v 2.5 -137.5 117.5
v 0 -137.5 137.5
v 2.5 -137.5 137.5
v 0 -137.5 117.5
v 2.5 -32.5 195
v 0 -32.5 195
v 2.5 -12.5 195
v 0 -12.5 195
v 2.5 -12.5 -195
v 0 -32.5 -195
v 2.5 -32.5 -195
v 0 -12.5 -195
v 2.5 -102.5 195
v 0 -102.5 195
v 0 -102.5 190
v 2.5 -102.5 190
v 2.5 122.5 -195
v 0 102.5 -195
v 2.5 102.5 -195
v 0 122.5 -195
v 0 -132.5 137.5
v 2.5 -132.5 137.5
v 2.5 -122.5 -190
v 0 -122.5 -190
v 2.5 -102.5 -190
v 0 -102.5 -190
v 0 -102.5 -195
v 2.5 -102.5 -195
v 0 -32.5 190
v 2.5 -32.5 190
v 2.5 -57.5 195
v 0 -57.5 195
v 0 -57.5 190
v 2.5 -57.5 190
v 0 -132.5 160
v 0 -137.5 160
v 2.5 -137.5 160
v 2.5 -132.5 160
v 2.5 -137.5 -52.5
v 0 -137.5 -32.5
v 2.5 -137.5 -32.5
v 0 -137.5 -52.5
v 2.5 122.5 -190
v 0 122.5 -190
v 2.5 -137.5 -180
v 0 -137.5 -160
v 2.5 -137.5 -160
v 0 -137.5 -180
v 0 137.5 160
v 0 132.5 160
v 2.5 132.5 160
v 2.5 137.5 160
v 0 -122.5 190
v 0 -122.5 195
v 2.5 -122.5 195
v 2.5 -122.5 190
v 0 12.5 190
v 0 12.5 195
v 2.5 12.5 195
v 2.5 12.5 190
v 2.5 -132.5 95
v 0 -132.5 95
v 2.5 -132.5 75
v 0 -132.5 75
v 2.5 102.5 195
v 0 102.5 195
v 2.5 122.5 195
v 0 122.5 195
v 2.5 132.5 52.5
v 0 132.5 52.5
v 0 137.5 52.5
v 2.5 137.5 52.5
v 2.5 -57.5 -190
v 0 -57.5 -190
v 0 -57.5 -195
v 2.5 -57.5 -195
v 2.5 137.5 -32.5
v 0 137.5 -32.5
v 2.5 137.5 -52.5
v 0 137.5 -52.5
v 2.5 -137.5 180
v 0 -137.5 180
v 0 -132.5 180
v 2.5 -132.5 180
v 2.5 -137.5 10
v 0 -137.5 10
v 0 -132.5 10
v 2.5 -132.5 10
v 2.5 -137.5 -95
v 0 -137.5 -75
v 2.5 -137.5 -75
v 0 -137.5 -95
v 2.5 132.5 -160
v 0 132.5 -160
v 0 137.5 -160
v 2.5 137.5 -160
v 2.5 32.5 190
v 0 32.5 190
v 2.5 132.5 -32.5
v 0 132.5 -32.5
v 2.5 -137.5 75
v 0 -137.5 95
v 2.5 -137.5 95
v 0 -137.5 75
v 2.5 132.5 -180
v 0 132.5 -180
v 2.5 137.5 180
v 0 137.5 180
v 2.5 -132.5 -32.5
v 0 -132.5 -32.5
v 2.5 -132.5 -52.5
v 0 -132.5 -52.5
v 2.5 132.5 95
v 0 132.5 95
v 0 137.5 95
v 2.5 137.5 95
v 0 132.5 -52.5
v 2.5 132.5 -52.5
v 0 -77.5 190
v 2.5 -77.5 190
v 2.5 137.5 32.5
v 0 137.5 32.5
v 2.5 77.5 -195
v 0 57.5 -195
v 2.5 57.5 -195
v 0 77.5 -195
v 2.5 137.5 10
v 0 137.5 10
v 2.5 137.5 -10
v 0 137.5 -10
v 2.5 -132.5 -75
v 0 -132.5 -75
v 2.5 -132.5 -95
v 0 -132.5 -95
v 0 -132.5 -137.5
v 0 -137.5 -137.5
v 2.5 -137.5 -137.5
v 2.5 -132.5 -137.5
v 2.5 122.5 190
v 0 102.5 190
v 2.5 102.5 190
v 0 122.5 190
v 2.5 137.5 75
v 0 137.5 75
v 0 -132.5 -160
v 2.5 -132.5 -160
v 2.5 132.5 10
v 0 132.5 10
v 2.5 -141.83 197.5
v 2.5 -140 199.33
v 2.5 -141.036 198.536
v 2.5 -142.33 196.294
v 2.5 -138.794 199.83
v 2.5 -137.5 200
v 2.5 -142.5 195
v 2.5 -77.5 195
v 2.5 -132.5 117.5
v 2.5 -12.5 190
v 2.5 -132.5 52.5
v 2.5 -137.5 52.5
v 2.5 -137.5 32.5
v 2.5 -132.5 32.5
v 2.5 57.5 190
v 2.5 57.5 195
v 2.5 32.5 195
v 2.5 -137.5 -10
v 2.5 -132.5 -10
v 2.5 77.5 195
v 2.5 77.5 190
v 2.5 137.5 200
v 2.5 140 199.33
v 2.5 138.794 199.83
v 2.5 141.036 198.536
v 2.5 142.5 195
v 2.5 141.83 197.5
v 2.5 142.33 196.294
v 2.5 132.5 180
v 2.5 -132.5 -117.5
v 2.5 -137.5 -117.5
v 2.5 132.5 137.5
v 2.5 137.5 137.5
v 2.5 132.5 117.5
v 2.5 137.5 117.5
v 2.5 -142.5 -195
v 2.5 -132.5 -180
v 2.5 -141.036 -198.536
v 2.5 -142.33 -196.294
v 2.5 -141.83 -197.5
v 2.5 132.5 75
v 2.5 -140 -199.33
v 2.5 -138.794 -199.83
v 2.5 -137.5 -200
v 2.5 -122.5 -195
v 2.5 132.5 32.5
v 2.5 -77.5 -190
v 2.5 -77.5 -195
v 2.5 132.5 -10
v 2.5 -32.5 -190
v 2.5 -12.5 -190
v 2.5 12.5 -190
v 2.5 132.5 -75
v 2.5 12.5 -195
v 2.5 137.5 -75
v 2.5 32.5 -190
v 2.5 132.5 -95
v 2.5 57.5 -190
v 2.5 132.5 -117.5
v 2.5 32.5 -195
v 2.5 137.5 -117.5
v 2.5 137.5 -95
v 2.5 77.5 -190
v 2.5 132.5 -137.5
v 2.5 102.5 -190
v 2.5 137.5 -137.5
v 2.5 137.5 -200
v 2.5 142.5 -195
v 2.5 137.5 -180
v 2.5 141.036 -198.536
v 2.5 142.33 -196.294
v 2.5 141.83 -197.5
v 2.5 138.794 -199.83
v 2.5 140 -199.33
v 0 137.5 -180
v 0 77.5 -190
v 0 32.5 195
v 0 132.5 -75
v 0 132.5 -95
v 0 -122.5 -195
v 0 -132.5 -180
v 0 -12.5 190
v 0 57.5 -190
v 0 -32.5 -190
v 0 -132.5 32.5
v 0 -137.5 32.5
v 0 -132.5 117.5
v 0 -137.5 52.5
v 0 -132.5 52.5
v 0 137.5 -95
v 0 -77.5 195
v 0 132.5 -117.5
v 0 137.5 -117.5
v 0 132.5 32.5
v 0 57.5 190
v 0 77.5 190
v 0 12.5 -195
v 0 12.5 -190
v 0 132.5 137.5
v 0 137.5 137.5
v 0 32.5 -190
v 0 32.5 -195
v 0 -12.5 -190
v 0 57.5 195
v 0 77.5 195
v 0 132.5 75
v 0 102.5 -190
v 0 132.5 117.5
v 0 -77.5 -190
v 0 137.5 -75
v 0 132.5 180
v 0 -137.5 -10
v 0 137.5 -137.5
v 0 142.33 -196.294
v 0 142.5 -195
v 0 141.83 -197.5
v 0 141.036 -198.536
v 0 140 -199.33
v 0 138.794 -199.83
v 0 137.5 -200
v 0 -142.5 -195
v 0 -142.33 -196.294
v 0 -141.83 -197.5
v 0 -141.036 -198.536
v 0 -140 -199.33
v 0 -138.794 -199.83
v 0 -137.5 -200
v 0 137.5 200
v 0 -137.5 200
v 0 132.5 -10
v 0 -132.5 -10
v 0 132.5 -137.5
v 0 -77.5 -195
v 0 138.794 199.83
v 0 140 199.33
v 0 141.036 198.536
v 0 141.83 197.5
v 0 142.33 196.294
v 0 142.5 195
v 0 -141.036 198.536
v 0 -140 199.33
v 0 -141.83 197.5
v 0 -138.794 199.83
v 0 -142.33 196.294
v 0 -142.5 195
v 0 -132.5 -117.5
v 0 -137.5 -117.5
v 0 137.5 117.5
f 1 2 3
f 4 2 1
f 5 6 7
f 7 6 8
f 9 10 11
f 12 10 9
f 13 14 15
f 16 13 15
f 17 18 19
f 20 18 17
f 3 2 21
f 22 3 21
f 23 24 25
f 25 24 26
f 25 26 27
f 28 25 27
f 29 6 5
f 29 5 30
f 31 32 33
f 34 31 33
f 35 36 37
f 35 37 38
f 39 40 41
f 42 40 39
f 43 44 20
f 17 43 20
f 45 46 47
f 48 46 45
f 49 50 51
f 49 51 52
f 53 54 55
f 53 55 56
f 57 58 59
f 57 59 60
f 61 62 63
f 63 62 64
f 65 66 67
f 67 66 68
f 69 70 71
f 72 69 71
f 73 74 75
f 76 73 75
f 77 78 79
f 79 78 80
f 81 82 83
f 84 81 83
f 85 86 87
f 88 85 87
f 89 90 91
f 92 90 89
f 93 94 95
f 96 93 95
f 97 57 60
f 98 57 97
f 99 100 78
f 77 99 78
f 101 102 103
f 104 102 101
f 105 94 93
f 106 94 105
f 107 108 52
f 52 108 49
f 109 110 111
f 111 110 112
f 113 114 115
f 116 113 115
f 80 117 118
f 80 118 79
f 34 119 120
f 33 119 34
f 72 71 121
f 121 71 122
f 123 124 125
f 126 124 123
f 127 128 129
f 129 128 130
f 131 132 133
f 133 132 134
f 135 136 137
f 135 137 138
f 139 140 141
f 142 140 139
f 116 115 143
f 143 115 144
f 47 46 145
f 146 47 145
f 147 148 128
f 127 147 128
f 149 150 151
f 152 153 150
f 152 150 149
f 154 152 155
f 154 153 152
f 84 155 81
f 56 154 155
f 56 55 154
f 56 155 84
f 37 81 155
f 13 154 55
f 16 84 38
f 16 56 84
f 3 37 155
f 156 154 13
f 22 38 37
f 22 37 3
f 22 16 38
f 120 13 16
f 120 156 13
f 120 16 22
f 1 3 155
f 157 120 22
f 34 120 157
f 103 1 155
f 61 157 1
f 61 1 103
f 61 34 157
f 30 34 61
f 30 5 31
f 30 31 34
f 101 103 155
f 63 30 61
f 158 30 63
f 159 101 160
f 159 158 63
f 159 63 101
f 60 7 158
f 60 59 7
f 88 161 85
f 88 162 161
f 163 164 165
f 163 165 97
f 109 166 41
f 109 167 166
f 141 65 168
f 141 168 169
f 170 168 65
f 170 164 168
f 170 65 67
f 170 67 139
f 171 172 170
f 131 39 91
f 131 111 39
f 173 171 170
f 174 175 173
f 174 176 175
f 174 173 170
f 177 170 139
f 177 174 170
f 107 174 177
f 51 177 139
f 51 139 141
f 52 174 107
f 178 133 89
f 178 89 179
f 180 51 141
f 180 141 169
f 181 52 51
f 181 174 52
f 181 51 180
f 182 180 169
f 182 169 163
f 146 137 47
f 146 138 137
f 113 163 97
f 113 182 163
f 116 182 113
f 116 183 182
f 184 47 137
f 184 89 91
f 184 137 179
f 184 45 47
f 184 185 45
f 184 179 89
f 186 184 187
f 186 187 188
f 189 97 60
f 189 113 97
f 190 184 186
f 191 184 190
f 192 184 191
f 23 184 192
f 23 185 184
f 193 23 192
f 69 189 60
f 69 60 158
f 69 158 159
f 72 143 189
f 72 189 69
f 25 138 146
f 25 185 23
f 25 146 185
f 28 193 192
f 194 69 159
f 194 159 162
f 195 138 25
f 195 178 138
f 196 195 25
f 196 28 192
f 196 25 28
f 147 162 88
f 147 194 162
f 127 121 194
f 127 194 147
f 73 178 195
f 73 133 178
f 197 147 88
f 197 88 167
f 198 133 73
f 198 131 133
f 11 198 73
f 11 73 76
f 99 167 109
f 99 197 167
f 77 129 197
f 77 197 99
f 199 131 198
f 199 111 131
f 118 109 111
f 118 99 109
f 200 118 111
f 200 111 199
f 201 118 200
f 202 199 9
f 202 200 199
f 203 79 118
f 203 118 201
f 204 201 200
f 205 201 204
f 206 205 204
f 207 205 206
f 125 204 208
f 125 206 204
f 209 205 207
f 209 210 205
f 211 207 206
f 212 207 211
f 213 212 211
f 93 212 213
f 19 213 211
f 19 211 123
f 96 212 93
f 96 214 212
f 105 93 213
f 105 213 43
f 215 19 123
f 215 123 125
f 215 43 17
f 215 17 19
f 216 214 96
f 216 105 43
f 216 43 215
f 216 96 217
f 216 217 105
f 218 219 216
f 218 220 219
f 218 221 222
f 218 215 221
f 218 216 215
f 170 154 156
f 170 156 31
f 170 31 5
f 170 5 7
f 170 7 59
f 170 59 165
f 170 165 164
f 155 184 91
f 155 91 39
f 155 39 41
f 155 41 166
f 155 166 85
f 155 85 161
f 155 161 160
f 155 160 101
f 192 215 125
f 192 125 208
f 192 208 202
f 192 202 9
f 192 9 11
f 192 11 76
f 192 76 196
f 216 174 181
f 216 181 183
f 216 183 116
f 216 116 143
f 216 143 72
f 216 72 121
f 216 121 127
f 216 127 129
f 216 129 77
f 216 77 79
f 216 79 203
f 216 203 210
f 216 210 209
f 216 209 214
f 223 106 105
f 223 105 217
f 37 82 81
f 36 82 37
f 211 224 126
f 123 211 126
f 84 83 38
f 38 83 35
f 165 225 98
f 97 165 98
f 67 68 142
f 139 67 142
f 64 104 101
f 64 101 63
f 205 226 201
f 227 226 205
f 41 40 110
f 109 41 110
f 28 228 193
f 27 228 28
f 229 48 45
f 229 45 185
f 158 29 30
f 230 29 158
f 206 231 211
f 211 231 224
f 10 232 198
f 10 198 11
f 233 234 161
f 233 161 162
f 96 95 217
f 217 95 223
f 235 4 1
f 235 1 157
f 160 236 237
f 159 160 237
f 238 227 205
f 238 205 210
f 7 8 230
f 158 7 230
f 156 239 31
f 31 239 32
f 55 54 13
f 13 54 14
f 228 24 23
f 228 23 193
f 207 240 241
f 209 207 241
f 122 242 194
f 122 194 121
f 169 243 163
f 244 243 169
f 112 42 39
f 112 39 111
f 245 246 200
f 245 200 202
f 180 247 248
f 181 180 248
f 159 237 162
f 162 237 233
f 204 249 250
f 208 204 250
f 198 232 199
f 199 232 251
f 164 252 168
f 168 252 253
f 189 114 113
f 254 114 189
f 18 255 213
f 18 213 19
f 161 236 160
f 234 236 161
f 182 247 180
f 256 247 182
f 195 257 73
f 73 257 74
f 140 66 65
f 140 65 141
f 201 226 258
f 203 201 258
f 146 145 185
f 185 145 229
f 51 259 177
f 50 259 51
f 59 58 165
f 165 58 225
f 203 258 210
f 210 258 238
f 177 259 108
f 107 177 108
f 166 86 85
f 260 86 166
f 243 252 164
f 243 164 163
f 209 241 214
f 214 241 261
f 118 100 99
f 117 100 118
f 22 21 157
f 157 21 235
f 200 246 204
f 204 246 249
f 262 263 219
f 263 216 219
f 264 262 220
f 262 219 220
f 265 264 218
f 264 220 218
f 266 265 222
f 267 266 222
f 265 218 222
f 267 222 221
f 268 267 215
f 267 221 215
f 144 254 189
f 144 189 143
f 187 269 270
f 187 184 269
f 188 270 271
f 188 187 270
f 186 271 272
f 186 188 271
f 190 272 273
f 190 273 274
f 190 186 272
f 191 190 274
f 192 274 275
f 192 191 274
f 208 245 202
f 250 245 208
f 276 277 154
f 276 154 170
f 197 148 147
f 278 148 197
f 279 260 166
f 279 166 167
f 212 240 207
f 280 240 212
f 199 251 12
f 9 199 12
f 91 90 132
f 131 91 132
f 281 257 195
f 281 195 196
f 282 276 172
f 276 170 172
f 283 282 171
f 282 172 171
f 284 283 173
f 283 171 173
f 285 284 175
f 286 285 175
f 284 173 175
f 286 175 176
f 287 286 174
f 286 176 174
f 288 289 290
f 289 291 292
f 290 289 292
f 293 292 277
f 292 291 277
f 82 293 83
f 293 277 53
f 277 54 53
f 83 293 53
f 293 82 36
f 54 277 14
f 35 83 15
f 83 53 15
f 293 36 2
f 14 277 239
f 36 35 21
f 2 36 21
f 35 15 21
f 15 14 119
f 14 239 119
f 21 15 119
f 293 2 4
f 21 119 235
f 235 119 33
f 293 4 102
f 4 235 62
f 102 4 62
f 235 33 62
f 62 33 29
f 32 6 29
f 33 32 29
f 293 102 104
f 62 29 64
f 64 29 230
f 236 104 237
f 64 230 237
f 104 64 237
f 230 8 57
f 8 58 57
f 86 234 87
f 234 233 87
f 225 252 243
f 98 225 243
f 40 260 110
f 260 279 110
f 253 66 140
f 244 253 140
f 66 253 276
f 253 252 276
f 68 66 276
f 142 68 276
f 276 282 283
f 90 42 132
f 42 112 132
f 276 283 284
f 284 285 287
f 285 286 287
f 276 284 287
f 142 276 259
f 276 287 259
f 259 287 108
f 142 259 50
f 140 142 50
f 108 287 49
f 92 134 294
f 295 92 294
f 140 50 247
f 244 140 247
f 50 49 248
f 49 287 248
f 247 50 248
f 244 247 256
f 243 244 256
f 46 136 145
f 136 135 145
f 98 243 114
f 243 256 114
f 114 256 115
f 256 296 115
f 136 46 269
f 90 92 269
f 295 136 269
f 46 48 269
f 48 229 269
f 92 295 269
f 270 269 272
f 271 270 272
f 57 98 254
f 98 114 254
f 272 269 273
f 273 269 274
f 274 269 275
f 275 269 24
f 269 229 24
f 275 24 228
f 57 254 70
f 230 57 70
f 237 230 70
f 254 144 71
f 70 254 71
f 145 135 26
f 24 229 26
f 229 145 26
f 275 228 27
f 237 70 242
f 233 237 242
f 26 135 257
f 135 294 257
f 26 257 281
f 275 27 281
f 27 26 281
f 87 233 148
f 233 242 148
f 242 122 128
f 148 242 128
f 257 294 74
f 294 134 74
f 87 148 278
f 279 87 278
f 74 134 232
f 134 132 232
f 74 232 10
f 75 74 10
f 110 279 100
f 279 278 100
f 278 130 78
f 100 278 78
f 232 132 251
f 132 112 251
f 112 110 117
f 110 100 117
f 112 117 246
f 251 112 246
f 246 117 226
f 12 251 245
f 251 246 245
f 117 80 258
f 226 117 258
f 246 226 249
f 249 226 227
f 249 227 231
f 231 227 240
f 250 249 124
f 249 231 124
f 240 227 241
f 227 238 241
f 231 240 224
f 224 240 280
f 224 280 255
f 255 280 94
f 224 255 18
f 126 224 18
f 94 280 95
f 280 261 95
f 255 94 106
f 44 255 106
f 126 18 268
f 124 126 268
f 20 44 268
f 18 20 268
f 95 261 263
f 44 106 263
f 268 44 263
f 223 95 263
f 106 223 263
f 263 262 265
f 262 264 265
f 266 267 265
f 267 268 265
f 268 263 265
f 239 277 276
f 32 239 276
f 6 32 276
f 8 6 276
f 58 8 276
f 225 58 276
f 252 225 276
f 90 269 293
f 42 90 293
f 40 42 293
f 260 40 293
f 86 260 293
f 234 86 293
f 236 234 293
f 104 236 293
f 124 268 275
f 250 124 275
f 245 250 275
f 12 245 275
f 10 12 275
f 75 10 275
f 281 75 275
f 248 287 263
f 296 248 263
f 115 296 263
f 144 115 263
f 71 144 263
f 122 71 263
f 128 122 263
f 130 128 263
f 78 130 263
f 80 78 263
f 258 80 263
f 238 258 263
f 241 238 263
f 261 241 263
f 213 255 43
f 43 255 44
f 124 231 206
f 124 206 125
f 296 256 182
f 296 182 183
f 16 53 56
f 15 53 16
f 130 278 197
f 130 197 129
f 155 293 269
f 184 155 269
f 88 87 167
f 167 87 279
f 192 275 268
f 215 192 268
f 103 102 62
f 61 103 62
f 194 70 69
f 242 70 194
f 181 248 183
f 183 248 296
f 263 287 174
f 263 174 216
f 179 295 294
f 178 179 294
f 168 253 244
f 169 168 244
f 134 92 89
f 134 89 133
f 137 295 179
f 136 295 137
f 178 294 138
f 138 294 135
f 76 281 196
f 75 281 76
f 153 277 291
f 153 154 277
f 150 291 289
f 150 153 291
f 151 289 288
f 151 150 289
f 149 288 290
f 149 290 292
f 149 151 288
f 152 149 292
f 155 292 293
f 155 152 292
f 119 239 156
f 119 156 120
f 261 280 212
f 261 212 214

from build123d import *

# Parameters (mm, degrees)
SKETCH1_2_W         = 400
SKETCH1_2_H         = 285
SKETCH1_2_W_2       = 20
SKETCH1_2_H_2       = 5
SKETCH1_2_W_3       = 5
SKETCH1_2_H_3       = 20
BOSS_EXTRUDE3_DEPTH = 2.5
FILLET2_R           = 5


with BuildPart() as part:
    # Sketch1<2> → Boss-Extrude3 (new body)
    with BuildSketch(Plane(origin=(0, 0, 0), x_dir=(0, 0, -1), z_dir=(1, 0, 0))):
        Rectangle(SKETCH1_2_W, SKETCH1_2_H)
        with Locations((-170, 135)):
            Rectangle(SKETCH1_2_W_2, SKETCH1_2_H_2, mode=Mode.SUBTRACT)
        with Locations((-170, -135)):
            Rectangle(SKETCH1_2_W_2, SKETCH1_2_H_2, mode=Mode.SUBTRACT)
        with Locations((-127.5, 135)):
            Rectangle(SKETCH1_2_W_2, SKETCH1_2_H_2, mode=Mode.SUBTRACT)
        with Locations((-127.5, -135)):
            Rectangle(SKETCH1_2_W_2, SKETCH1_2_H_2, mode=Mode.SUBTRACT)
        with Locations((-85, 135)):
            Rectangle(SKETCH1_2_W_2, SKETCH1_2_H_2, mode=Mode.SUBTRACT)
        with Locations((-85, -135)):
            Rectangle(SKETCH1_2_W_2, SKETCH1_2_H_2, mode=Mode.SUBTRACT)
        with Locations((-42.5, 135)):
            Rectangle(SKETCH1_2_W_2, SKETCH1_2_H_2, mode=Mode.SUBTRACT)
        with Locations((-42.5, -135)):
            Rectangle(SKETCH1_2_W_2, SKETCH1_2_H_2, mode=Mode.SUBTRACT)
        with Locations((0, 135)):
            Rectangle(SKETCH1_2_W_2, SKETCH1_2_H_2, mode=Mode.SUBTRACT)
        with Locations((0, -135)):
            Rectangle(SKETCH1_2_W_2, SKETCH1_2_H_2, mode=Mode.SUBTRACT)
        with Locations((42.5, 135)):
            Rectangle(SKETCH1_2_W_2, SKETCH1_2_H_2, mode=Mode.SUBTRACT)
        with Locations((42.5, -135)):
            Rectangle(SKETCH1_2_W_2, SKETCH1_2_H_2, mode=Mode.SUBTRACT)
        with Locations((85, 135)):
            Rectangle(SKETCH1_2_W_2, SKETCH1_2_H_2, mode=Mode.SUBTRACT)
        with Locations((85, -135)):
            Rectangle(SKETCH1_2_W_2, SKETCH1_2_H_2, mode=Mode.SUBTRACT)
        with Locations((127.5, 135)):
            Rectangle(SKETCH1_2_W_2, SKETCH1_2_H_2, mode=Mode.SUBTRACT)
        with Locations((127.5, -135)):
            Rectangle(SKETCH1_2_W_2, SKETCH1_2_H_2, mode=Mode.SUBTRACT)
        with Locations((170, 135)):
            Rectangle(SKETCH1_2_W_2, SKETCH1_2_H_2, mode=Mode.SUBTRACT)
        with Locations((170, -135)):
            Rectangle(SKETCH1_2_W_2, SKETCH1_2_H_2, mode=Mode.SUBTRACT)
        with Locations((192.5, 112.5)):
            Rectangle(SKETCH1_2_W_3, SKETCH1_2_H_3, mode=Mode.SUBTRACT)
        with Locations((-192.5, 112.5)):
            Rectangle(SKETCH1_2_W_3, SKETCH1_2_H_3, mode=Mode.SUBTRACT)
        with Locations((-192.5, 67.5)):
            Rectangle(SKETCH1_2_W_3, SKETCH1_2_H_3, mode=Mode.SUBTRACT)
        with Locations((192.5, 67.5)):
            Rectangle(SKETCH1_2_W_3, SKETCH1_2_H_3, mode=Mode.SUBTRACT)
        with Locations((-192.5, 22.5)):
            Rectangle(SKETCH1_2_W_3, SKETCH1_2_H_3, mode=Mode.SUBTRACT)
        with Locations((192.5, 22.5)):
            Rectangle(SKETCH1_2_W_3, SKETCH1_2_H_3, mode=Mode.SUBTRACT)
        with Locations((-192.5, -22.5)):
            Rectangle(SKETCH1_2_W_3, SKETCH1_2_H_3, mode=Mode.SUBTRACT)
        with Locations((192.5, -22.5)):
            Rectangle(SKETCH1_2_W_3, SKETCH1_2_H_3, mode=Mode.SUBTRACT)
        with Locations((-192.5, -67.5)):
            Rectangle(SKETCH1_2_W_3, SKETCH1_2_H_3, mode=Mode.SUBTRACT)
        with Locations((192.5, -67.5)):
            Rectangle(SKETCH1_2_W_3, SKETCH1_2_H_3, mode=Mode.SUBTRACT)
        with Locations((-192.5, -112.5)):
            Rectangle(SKETCH1_2_W_3, SKETCH1_2_H_3, mode=Mode.SUBTRACT)
        with Locations((192.5, -112.5)):
            Rectangle(SKETCH1_2_W_3, SKETCH1_2_H_3, mode=Mode.SUBTRACT)
    extrude(amount=BOSS_EXTRUDE3_DEPTH)

    # Fillet2
    fillet2_edges = [part.edges().sort_by_distance(p)[0] for p in [
        (1.25, -142.5, 200),
        (1.25, 142.5, 200),
        (1.25, 142.5, -200),
        (1.25, -142.5, -200),
    ]]
    fillet(fillet2_edges, radius=FILLET2_R)


solid = part.part
